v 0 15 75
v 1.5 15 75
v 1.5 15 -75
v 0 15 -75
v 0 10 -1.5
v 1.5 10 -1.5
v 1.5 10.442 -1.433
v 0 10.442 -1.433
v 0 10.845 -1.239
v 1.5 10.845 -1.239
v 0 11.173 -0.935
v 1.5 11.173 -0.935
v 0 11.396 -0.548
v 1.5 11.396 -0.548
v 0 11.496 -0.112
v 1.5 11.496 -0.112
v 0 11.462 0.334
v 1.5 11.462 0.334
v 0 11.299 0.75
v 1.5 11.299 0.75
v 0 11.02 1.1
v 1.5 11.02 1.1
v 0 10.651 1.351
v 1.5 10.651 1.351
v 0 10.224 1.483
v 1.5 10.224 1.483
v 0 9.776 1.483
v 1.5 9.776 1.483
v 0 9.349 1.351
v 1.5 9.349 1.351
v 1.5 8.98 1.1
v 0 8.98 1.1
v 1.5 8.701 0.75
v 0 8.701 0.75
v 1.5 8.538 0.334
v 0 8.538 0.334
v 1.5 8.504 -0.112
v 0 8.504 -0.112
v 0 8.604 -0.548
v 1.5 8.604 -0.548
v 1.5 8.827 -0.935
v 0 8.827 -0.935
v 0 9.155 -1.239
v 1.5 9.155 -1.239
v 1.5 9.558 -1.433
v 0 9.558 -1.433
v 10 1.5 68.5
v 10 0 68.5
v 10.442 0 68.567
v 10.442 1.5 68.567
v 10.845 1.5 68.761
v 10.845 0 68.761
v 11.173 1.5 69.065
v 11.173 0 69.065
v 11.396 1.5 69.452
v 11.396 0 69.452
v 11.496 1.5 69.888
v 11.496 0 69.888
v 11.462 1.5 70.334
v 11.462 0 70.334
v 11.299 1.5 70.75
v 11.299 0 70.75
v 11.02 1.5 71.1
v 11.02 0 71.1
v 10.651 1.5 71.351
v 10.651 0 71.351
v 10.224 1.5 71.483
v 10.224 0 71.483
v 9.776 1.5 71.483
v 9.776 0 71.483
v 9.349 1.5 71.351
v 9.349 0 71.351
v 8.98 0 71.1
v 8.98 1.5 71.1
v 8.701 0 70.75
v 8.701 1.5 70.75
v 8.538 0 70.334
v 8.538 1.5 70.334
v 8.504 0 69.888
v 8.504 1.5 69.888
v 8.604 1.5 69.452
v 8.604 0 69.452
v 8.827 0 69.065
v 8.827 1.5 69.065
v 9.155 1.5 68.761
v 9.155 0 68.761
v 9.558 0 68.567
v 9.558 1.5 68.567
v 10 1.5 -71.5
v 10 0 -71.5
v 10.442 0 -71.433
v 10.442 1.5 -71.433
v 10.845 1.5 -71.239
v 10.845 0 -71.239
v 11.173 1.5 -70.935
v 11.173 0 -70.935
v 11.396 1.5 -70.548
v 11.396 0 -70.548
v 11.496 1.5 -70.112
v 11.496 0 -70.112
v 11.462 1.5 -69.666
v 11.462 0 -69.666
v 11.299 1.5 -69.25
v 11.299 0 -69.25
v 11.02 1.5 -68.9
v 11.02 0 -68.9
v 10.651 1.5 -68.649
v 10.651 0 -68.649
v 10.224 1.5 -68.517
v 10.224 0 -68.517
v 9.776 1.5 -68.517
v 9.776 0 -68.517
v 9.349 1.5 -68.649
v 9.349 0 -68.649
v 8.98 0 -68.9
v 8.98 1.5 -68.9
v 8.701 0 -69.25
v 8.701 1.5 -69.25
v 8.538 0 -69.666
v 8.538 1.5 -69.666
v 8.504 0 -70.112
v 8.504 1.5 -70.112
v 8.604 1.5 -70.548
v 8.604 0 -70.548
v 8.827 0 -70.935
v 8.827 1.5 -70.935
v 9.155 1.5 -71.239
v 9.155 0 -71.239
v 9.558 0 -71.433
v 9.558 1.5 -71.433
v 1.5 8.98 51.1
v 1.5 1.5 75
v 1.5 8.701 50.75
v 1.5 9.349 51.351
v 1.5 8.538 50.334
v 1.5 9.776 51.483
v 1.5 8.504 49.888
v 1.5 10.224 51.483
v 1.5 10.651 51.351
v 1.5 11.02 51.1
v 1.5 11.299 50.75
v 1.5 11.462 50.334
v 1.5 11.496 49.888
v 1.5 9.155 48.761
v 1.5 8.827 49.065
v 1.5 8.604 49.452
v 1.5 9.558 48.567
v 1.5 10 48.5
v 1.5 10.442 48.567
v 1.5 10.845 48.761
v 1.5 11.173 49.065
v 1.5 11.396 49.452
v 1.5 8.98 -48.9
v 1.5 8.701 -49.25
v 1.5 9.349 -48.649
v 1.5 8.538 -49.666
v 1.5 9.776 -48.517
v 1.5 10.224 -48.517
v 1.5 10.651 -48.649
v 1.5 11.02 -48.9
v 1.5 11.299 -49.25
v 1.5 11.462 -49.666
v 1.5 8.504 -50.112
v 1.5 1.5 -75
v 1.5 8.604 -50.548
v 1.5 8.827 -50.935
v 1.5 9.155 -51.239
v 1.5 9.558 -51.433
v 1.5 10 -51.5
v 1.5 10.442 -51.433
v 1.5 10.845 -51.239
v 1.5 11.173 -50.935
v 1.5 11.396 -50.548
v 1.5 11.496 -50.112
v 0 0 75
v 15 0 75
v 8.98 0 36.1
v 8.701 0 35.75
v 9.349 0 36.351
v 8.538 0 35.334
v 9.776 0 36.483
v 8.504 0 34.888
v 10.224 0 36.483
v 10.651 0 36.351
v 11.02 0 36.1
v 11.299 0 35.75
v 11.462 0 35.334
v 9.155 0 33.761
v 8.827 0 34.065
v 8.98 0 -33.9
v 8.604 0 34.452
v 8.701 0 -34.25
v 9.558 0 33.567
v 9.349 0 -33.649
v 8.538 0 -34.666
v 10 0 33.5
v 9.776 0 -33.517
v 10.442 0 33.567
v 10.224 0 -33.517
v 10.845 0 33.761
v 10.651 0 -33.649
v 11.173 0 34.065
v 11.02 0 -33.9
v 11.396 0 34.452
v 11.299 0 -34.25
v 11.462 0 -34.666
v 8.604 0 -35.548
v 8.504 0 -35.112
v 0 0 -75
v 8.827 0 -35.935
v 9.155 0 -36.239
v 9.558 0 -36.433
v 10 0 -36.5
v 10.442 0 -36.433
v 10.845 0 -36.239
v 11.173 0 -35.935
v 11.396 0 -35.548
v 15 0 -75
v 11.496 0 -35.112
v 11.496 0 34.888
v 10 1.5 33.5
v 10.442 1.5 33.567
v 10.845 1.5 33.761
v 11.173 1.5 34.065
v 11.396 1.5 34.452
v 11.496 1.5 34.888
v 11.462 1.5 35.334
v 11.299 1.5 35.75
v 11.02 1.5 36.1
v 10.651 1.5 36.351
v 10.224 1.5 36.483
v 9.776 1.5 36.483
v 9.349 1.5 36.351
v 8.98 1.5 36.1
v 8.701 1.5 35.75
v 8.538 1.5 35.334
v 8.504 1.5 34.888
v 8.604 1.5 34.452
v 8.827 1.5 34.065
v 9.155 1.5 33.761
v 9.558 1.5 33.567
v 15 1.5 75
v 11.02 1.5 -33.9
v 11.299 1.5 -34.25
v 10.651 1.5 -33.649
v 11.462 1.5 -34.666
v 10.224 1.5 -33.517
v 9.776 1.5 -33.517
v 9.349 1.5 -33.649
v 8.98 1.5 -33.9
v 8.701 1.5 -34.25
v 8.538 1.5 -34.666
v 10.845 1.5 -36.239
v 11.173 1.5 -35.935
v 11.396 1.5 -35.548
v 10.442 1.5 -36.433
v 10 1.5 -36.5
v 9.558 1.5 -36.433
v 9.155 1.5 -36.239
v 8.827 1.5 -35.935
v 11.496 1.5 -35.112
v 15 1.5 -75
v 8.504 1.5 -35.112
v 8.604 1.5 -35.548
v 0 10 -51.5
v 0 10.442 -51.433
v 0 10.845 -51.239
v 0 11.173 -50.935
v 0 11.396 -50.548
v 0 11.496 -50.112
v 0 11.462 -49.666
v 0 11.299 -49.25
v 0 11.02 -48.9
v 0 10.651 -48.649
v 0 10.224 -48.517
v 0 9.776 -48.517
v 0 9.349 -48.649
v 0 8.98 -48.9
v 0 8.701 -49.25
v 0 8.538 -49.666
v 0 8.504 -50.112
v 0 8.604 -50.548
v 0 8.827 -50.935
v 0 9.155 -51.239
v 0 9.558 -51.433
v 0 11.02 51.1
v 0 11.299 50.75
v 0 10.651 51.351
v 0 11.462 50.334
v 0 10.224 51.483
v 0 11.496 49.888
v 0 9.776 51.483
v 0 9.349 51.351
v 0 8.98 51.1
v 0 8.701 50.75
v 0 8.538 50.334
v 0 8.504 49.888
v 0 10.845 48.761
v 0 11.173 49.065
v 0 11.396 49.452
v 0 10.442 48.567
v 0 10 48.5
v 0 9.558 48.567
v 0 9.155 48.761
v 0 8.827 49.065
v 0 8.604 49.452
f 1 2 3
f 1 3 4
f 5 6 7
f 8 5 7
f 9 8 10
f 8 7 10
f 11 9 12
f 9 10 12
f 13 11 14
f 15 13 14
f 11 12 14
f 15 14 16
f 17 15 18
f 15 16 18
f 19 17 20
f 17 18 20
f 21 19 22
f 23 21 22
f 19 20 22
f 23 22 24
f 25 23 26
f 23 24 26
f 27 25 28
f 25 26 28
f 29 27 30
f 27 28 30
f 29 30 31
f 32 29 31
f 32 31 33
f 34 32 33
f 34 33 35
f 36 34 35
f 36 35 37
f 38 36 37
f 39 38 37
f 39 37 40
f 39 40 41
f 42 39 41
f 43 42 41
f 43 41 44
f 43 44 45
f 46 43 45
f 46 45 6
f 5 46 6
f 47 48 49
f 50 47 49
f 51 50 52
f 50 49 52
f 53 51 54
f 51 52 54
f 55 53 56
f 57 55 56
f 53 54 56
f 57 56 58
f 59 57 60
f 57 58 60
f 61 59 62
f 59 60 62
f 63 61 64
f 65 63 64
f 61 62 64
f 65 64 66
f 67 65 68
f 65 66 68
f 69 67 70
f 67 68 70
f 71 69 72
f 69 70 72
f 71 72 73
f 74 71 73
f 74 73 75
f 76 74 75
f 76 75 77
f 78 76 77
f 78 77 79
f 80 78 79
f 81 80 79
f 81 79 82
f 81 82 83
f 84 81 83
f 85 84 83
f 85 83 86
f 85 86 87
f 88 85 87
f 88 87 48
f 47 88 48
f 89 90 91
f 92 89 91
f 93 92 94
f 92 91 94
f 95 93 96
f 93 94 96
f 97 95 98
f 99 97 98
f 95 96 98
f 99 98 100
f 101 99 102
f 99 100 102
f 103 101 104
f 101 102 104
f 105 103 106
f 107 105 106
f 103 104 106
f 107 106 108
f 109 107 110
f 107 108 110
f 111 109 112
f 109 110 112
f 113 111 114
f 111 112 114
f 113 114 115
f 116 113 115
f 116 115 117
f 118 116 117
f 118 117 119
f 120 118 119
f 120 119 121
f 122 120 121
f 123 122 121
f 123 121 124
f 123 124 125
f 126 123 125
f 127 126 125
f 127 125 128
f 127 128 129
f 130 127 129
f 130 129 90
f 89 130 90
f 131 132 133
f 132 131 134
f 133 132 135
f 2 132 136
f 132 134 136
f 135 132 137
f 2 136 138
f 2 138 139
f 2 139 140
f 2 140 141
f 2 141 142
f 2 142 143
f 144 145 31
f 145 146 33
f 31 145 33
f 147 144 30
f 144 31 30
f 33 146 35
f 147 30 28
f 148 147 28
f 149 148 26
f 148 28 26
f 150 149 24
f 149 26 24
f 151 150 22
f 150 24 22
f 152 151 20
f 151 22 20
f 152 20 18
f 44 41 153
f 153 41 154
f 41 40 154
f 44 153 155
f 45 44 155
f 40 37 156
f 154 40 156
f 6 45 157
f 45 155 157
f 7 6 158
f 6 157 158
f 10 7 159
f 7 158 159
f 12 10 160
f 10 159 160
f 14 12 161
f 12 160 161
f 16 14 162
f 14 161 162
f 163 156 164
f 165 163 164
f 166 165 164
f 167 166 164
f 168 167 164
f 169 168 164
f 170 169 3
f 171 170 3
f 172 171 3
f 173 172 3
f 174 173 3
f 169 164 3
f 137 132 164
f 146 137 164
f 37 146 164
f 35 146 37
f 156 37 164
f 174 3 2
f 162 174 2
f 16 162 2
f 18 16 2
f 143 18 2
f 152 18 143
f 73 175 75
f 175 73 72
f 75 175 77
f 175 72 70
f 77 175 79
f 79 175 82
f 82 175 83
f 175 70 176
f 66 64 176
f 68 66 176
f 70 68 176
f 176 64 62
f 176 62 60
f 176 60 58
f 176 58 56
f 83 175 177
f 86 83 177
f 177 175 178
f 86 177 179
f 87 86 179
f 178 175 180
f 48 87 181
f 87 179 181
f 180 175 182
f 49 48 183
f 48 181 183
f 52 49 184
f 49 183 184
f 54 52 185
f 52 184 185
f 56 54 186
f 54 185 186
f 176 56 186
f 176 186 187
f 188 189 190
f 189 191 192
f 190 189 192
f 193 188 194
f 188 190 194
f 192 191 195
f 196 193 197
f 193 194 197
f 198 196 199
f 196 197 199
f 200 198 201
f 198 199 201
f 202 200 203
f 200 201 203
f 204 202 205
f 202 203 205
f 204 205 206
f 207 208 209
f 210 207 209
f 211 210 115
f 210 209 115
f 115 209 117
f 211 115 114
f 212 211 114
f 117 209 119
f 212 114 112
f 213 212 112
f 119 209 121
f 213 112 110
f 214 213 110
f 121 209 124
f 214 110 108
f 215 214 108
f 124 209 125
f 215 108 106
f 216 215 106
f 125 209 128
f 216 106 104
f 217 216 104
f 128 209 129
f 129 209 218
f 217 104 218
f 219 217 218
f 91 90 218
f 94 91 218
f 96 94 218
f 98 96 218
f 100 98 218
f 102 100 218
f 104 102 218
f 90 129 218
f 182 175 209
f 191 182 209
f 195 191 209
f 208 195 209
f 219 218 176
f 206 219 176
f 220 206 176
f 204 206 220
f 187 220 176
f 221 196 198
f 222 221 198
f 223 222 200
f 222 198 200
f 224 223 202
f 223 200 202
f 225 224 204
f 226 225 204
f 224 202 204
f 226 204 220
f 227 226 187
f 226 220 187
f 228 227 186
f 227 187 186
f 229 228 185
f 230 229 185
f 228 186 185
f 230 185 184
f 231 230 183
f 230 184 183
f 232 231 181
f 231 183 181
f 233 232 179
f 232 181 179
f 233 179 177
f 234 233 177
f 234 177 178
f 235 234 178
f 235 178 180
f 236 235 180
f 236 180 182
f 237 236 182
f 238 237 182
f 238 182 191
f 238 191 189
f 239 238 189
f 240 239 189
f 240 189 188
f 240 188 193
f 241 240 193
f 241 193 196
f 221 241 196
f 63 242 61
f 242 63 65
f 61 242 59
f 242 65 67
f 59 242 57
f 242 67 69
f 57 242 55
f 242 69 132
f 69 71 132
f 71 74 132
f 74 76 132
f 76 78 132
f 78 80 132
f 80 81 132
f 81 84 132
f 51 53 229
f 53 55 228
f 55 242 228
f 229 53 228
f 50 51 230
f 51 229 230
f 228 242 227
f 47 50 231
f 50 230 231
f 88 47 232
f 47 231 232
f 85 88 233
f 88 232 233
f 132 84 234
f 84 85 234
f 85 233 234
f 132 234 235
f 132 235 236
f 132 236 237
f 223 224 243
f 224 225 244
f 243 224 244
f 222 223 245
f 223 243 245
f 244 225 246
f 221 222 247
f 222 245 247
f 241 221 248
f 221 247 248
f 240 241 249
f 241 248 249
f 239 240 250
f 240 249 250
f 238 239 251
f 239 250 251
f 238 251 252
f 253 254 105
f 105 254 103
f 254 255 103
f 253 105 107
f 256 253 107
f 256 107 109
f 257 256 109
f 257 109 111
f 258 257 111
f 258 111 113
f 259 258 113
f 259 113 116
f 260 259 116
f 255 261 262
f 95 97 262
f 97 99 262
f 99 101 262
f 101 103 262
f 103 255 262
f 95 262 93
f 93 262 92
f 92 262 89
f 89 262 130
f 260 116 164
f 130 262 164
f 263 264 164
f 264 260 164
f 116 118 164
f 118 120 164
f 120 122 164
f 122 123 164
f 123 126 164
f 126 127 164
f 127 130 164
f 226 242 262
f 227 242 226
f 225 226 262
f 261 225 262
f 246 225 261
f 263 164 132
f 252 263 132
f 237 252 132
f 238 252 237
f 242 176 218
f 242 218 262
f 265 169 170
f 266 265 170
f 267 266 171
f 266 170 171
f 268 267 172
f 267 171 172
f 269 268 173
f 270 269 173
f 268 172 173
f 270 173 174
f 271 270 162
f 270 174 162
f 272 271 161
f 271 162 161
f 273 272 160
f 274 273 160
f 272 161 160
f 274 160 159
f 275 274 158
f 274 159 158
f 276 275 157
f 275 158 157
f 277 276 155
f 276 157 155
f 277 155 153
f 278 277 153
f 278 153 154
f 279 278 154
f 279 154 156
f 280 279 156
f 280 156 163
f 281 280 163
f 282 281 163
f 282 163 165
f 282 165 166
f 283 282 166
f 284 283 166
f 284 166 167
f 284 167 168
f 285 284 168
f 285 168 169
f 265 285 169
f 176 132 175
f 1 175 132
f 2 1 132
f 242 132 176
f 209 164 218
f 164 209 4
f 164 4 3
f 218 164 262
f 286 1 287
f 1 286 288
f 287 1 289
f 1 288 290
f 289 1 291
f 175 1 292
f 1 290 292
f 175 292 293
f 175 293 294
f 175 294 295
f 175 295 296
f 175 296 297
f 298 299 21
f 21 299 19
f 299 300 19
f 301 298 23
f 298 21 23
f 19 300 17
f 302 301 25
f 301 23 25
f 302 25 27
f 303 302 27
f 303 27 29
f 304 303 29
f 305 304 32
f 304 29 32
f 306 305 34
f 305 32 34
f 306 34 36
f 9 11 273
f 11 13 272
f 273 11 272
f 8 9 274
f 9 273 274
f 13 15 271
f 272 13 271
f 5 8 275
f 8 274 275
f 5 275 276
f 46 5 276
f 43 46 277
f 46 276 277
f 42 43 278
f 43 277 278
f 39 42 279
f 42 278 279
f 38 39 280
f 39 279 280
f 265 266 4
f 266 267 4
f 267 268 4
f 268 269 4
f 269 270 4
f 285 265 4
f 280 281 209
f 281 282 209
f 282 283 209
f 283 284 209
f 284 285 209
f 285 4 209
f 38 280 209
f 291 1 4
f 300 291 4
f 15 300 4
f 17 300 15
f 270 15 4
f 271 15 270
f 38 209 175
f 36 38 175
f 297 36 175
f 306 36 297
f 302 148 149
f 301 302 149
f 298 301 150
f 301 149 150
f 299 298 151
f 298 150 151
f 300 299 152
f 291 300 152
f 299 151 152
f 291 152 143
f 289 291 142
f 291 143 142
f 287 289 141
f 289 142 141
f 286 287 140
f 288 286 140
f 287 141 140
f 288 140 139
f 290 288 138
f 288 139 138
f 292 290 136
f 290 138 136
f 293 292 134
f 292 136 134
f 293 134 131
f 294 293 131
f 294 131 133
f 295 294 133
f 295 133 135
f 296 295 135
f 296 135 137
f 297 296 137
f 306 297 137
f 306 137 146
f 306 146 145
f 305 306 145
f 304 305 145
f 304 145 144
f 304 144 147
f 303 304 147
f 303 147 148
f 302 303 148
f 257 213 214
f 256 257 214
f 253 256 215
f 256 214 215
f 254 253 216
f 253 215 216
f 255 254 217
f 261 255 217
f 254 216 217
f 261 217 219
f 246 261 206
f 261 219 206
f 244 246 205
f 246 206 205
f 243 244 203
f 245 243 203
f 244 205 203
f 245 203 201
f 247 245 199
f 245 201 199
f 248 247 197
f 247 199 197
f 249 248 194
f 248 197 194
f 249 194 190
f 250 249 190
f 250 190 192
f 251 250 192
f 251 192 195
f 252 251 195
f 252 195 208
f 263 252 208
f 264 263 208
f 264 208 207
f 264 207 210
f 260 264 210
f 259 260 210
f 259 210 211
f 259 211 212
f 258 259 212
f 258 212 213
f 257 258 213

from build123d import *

# Parameters (mm, degrees)
EXTRUSION1_DEPTH           = 75
EXTRUSION1_DEPTH_BACK      = 75
ESQUISSE2_R                = 1.5
EXTRUSION2_DEPTH           = 78.667560796
ESQUISSE3_R                = 1.5
EXTRUSION3_DEPTH           = 78.942286341
R_P_TITION_LIN_AIRE1_COUNT = 3
R_P_TITION_LIN_AIRE1_PITCH = 50
R_P_TITION_LIN_AIRE2_COUNT = 5
R_P_TITION_LIN_AIRE2_PITCH = 35


with BuildPart() as part:
    # Esquisse1 → Extrusion1 (new, two sides: drawn at the far end of the back side and taken through both)
    with BuildSketch(Plane.XY.offset(-EXTRUSION1_DEPTH_BACK)):
        Polygon((0, 0), (2, 0), (15, 0), (15, 1.5), (1.5, 1.5), (1.5, 15), (0, 15), align=None)
    extrude(amount=EXTRUSION1_DEPTH + EXTRUSION1_DEPTH_BACK)

    # Esquisse2 → Extrusion2 (cut, through all)
    with BuildSketch(Plane(origin=(1.5, 0, 0), x_dir=(0, 0, -1), z_dir=(1, 0, 0))):
        with Locations((-50, 10)):
            Circle(ESQUISSE2_R)
    extrusion2 = extrude(amount=-EXTRUSION2_DEPTH, mode=Mode.SUBTRACT)

    # Esquisse3 → Extrusion3 (cut, through all)
    with BuildSketch(Plane.XZ):
        with Locations((10, 70)):
            Circle(ESQUISSE3_R)
    extrusion3 = extrude(amount=-EXTRUSION3_DEPTH, mode=Mode.SUBTRACT)

    # Répétition linéaire1: Extrusion2 ×3
    with Locations(*[(0, 0, -i * R_P_TITION_LIN_AIRE1_PITCH) for i in range(1, R_P_TITION_LIN_AIRE1_COUNT)]):
        add(extrusion2, mode=Mode.SUBTRACT)

    # Répétition linéaire2: Extrusion3 ×5, 1 skipped
    with Locations(*[(0, 0, -i * R_P_TITION_LIN_AIRE2_PITCH) for i in range(1, R_P_TITION_LIN_AIRE2_COUNT) if i not in (2,)]):
        add(extrusion3, mode=Mode.SUBTRACT)


solid = part.part
